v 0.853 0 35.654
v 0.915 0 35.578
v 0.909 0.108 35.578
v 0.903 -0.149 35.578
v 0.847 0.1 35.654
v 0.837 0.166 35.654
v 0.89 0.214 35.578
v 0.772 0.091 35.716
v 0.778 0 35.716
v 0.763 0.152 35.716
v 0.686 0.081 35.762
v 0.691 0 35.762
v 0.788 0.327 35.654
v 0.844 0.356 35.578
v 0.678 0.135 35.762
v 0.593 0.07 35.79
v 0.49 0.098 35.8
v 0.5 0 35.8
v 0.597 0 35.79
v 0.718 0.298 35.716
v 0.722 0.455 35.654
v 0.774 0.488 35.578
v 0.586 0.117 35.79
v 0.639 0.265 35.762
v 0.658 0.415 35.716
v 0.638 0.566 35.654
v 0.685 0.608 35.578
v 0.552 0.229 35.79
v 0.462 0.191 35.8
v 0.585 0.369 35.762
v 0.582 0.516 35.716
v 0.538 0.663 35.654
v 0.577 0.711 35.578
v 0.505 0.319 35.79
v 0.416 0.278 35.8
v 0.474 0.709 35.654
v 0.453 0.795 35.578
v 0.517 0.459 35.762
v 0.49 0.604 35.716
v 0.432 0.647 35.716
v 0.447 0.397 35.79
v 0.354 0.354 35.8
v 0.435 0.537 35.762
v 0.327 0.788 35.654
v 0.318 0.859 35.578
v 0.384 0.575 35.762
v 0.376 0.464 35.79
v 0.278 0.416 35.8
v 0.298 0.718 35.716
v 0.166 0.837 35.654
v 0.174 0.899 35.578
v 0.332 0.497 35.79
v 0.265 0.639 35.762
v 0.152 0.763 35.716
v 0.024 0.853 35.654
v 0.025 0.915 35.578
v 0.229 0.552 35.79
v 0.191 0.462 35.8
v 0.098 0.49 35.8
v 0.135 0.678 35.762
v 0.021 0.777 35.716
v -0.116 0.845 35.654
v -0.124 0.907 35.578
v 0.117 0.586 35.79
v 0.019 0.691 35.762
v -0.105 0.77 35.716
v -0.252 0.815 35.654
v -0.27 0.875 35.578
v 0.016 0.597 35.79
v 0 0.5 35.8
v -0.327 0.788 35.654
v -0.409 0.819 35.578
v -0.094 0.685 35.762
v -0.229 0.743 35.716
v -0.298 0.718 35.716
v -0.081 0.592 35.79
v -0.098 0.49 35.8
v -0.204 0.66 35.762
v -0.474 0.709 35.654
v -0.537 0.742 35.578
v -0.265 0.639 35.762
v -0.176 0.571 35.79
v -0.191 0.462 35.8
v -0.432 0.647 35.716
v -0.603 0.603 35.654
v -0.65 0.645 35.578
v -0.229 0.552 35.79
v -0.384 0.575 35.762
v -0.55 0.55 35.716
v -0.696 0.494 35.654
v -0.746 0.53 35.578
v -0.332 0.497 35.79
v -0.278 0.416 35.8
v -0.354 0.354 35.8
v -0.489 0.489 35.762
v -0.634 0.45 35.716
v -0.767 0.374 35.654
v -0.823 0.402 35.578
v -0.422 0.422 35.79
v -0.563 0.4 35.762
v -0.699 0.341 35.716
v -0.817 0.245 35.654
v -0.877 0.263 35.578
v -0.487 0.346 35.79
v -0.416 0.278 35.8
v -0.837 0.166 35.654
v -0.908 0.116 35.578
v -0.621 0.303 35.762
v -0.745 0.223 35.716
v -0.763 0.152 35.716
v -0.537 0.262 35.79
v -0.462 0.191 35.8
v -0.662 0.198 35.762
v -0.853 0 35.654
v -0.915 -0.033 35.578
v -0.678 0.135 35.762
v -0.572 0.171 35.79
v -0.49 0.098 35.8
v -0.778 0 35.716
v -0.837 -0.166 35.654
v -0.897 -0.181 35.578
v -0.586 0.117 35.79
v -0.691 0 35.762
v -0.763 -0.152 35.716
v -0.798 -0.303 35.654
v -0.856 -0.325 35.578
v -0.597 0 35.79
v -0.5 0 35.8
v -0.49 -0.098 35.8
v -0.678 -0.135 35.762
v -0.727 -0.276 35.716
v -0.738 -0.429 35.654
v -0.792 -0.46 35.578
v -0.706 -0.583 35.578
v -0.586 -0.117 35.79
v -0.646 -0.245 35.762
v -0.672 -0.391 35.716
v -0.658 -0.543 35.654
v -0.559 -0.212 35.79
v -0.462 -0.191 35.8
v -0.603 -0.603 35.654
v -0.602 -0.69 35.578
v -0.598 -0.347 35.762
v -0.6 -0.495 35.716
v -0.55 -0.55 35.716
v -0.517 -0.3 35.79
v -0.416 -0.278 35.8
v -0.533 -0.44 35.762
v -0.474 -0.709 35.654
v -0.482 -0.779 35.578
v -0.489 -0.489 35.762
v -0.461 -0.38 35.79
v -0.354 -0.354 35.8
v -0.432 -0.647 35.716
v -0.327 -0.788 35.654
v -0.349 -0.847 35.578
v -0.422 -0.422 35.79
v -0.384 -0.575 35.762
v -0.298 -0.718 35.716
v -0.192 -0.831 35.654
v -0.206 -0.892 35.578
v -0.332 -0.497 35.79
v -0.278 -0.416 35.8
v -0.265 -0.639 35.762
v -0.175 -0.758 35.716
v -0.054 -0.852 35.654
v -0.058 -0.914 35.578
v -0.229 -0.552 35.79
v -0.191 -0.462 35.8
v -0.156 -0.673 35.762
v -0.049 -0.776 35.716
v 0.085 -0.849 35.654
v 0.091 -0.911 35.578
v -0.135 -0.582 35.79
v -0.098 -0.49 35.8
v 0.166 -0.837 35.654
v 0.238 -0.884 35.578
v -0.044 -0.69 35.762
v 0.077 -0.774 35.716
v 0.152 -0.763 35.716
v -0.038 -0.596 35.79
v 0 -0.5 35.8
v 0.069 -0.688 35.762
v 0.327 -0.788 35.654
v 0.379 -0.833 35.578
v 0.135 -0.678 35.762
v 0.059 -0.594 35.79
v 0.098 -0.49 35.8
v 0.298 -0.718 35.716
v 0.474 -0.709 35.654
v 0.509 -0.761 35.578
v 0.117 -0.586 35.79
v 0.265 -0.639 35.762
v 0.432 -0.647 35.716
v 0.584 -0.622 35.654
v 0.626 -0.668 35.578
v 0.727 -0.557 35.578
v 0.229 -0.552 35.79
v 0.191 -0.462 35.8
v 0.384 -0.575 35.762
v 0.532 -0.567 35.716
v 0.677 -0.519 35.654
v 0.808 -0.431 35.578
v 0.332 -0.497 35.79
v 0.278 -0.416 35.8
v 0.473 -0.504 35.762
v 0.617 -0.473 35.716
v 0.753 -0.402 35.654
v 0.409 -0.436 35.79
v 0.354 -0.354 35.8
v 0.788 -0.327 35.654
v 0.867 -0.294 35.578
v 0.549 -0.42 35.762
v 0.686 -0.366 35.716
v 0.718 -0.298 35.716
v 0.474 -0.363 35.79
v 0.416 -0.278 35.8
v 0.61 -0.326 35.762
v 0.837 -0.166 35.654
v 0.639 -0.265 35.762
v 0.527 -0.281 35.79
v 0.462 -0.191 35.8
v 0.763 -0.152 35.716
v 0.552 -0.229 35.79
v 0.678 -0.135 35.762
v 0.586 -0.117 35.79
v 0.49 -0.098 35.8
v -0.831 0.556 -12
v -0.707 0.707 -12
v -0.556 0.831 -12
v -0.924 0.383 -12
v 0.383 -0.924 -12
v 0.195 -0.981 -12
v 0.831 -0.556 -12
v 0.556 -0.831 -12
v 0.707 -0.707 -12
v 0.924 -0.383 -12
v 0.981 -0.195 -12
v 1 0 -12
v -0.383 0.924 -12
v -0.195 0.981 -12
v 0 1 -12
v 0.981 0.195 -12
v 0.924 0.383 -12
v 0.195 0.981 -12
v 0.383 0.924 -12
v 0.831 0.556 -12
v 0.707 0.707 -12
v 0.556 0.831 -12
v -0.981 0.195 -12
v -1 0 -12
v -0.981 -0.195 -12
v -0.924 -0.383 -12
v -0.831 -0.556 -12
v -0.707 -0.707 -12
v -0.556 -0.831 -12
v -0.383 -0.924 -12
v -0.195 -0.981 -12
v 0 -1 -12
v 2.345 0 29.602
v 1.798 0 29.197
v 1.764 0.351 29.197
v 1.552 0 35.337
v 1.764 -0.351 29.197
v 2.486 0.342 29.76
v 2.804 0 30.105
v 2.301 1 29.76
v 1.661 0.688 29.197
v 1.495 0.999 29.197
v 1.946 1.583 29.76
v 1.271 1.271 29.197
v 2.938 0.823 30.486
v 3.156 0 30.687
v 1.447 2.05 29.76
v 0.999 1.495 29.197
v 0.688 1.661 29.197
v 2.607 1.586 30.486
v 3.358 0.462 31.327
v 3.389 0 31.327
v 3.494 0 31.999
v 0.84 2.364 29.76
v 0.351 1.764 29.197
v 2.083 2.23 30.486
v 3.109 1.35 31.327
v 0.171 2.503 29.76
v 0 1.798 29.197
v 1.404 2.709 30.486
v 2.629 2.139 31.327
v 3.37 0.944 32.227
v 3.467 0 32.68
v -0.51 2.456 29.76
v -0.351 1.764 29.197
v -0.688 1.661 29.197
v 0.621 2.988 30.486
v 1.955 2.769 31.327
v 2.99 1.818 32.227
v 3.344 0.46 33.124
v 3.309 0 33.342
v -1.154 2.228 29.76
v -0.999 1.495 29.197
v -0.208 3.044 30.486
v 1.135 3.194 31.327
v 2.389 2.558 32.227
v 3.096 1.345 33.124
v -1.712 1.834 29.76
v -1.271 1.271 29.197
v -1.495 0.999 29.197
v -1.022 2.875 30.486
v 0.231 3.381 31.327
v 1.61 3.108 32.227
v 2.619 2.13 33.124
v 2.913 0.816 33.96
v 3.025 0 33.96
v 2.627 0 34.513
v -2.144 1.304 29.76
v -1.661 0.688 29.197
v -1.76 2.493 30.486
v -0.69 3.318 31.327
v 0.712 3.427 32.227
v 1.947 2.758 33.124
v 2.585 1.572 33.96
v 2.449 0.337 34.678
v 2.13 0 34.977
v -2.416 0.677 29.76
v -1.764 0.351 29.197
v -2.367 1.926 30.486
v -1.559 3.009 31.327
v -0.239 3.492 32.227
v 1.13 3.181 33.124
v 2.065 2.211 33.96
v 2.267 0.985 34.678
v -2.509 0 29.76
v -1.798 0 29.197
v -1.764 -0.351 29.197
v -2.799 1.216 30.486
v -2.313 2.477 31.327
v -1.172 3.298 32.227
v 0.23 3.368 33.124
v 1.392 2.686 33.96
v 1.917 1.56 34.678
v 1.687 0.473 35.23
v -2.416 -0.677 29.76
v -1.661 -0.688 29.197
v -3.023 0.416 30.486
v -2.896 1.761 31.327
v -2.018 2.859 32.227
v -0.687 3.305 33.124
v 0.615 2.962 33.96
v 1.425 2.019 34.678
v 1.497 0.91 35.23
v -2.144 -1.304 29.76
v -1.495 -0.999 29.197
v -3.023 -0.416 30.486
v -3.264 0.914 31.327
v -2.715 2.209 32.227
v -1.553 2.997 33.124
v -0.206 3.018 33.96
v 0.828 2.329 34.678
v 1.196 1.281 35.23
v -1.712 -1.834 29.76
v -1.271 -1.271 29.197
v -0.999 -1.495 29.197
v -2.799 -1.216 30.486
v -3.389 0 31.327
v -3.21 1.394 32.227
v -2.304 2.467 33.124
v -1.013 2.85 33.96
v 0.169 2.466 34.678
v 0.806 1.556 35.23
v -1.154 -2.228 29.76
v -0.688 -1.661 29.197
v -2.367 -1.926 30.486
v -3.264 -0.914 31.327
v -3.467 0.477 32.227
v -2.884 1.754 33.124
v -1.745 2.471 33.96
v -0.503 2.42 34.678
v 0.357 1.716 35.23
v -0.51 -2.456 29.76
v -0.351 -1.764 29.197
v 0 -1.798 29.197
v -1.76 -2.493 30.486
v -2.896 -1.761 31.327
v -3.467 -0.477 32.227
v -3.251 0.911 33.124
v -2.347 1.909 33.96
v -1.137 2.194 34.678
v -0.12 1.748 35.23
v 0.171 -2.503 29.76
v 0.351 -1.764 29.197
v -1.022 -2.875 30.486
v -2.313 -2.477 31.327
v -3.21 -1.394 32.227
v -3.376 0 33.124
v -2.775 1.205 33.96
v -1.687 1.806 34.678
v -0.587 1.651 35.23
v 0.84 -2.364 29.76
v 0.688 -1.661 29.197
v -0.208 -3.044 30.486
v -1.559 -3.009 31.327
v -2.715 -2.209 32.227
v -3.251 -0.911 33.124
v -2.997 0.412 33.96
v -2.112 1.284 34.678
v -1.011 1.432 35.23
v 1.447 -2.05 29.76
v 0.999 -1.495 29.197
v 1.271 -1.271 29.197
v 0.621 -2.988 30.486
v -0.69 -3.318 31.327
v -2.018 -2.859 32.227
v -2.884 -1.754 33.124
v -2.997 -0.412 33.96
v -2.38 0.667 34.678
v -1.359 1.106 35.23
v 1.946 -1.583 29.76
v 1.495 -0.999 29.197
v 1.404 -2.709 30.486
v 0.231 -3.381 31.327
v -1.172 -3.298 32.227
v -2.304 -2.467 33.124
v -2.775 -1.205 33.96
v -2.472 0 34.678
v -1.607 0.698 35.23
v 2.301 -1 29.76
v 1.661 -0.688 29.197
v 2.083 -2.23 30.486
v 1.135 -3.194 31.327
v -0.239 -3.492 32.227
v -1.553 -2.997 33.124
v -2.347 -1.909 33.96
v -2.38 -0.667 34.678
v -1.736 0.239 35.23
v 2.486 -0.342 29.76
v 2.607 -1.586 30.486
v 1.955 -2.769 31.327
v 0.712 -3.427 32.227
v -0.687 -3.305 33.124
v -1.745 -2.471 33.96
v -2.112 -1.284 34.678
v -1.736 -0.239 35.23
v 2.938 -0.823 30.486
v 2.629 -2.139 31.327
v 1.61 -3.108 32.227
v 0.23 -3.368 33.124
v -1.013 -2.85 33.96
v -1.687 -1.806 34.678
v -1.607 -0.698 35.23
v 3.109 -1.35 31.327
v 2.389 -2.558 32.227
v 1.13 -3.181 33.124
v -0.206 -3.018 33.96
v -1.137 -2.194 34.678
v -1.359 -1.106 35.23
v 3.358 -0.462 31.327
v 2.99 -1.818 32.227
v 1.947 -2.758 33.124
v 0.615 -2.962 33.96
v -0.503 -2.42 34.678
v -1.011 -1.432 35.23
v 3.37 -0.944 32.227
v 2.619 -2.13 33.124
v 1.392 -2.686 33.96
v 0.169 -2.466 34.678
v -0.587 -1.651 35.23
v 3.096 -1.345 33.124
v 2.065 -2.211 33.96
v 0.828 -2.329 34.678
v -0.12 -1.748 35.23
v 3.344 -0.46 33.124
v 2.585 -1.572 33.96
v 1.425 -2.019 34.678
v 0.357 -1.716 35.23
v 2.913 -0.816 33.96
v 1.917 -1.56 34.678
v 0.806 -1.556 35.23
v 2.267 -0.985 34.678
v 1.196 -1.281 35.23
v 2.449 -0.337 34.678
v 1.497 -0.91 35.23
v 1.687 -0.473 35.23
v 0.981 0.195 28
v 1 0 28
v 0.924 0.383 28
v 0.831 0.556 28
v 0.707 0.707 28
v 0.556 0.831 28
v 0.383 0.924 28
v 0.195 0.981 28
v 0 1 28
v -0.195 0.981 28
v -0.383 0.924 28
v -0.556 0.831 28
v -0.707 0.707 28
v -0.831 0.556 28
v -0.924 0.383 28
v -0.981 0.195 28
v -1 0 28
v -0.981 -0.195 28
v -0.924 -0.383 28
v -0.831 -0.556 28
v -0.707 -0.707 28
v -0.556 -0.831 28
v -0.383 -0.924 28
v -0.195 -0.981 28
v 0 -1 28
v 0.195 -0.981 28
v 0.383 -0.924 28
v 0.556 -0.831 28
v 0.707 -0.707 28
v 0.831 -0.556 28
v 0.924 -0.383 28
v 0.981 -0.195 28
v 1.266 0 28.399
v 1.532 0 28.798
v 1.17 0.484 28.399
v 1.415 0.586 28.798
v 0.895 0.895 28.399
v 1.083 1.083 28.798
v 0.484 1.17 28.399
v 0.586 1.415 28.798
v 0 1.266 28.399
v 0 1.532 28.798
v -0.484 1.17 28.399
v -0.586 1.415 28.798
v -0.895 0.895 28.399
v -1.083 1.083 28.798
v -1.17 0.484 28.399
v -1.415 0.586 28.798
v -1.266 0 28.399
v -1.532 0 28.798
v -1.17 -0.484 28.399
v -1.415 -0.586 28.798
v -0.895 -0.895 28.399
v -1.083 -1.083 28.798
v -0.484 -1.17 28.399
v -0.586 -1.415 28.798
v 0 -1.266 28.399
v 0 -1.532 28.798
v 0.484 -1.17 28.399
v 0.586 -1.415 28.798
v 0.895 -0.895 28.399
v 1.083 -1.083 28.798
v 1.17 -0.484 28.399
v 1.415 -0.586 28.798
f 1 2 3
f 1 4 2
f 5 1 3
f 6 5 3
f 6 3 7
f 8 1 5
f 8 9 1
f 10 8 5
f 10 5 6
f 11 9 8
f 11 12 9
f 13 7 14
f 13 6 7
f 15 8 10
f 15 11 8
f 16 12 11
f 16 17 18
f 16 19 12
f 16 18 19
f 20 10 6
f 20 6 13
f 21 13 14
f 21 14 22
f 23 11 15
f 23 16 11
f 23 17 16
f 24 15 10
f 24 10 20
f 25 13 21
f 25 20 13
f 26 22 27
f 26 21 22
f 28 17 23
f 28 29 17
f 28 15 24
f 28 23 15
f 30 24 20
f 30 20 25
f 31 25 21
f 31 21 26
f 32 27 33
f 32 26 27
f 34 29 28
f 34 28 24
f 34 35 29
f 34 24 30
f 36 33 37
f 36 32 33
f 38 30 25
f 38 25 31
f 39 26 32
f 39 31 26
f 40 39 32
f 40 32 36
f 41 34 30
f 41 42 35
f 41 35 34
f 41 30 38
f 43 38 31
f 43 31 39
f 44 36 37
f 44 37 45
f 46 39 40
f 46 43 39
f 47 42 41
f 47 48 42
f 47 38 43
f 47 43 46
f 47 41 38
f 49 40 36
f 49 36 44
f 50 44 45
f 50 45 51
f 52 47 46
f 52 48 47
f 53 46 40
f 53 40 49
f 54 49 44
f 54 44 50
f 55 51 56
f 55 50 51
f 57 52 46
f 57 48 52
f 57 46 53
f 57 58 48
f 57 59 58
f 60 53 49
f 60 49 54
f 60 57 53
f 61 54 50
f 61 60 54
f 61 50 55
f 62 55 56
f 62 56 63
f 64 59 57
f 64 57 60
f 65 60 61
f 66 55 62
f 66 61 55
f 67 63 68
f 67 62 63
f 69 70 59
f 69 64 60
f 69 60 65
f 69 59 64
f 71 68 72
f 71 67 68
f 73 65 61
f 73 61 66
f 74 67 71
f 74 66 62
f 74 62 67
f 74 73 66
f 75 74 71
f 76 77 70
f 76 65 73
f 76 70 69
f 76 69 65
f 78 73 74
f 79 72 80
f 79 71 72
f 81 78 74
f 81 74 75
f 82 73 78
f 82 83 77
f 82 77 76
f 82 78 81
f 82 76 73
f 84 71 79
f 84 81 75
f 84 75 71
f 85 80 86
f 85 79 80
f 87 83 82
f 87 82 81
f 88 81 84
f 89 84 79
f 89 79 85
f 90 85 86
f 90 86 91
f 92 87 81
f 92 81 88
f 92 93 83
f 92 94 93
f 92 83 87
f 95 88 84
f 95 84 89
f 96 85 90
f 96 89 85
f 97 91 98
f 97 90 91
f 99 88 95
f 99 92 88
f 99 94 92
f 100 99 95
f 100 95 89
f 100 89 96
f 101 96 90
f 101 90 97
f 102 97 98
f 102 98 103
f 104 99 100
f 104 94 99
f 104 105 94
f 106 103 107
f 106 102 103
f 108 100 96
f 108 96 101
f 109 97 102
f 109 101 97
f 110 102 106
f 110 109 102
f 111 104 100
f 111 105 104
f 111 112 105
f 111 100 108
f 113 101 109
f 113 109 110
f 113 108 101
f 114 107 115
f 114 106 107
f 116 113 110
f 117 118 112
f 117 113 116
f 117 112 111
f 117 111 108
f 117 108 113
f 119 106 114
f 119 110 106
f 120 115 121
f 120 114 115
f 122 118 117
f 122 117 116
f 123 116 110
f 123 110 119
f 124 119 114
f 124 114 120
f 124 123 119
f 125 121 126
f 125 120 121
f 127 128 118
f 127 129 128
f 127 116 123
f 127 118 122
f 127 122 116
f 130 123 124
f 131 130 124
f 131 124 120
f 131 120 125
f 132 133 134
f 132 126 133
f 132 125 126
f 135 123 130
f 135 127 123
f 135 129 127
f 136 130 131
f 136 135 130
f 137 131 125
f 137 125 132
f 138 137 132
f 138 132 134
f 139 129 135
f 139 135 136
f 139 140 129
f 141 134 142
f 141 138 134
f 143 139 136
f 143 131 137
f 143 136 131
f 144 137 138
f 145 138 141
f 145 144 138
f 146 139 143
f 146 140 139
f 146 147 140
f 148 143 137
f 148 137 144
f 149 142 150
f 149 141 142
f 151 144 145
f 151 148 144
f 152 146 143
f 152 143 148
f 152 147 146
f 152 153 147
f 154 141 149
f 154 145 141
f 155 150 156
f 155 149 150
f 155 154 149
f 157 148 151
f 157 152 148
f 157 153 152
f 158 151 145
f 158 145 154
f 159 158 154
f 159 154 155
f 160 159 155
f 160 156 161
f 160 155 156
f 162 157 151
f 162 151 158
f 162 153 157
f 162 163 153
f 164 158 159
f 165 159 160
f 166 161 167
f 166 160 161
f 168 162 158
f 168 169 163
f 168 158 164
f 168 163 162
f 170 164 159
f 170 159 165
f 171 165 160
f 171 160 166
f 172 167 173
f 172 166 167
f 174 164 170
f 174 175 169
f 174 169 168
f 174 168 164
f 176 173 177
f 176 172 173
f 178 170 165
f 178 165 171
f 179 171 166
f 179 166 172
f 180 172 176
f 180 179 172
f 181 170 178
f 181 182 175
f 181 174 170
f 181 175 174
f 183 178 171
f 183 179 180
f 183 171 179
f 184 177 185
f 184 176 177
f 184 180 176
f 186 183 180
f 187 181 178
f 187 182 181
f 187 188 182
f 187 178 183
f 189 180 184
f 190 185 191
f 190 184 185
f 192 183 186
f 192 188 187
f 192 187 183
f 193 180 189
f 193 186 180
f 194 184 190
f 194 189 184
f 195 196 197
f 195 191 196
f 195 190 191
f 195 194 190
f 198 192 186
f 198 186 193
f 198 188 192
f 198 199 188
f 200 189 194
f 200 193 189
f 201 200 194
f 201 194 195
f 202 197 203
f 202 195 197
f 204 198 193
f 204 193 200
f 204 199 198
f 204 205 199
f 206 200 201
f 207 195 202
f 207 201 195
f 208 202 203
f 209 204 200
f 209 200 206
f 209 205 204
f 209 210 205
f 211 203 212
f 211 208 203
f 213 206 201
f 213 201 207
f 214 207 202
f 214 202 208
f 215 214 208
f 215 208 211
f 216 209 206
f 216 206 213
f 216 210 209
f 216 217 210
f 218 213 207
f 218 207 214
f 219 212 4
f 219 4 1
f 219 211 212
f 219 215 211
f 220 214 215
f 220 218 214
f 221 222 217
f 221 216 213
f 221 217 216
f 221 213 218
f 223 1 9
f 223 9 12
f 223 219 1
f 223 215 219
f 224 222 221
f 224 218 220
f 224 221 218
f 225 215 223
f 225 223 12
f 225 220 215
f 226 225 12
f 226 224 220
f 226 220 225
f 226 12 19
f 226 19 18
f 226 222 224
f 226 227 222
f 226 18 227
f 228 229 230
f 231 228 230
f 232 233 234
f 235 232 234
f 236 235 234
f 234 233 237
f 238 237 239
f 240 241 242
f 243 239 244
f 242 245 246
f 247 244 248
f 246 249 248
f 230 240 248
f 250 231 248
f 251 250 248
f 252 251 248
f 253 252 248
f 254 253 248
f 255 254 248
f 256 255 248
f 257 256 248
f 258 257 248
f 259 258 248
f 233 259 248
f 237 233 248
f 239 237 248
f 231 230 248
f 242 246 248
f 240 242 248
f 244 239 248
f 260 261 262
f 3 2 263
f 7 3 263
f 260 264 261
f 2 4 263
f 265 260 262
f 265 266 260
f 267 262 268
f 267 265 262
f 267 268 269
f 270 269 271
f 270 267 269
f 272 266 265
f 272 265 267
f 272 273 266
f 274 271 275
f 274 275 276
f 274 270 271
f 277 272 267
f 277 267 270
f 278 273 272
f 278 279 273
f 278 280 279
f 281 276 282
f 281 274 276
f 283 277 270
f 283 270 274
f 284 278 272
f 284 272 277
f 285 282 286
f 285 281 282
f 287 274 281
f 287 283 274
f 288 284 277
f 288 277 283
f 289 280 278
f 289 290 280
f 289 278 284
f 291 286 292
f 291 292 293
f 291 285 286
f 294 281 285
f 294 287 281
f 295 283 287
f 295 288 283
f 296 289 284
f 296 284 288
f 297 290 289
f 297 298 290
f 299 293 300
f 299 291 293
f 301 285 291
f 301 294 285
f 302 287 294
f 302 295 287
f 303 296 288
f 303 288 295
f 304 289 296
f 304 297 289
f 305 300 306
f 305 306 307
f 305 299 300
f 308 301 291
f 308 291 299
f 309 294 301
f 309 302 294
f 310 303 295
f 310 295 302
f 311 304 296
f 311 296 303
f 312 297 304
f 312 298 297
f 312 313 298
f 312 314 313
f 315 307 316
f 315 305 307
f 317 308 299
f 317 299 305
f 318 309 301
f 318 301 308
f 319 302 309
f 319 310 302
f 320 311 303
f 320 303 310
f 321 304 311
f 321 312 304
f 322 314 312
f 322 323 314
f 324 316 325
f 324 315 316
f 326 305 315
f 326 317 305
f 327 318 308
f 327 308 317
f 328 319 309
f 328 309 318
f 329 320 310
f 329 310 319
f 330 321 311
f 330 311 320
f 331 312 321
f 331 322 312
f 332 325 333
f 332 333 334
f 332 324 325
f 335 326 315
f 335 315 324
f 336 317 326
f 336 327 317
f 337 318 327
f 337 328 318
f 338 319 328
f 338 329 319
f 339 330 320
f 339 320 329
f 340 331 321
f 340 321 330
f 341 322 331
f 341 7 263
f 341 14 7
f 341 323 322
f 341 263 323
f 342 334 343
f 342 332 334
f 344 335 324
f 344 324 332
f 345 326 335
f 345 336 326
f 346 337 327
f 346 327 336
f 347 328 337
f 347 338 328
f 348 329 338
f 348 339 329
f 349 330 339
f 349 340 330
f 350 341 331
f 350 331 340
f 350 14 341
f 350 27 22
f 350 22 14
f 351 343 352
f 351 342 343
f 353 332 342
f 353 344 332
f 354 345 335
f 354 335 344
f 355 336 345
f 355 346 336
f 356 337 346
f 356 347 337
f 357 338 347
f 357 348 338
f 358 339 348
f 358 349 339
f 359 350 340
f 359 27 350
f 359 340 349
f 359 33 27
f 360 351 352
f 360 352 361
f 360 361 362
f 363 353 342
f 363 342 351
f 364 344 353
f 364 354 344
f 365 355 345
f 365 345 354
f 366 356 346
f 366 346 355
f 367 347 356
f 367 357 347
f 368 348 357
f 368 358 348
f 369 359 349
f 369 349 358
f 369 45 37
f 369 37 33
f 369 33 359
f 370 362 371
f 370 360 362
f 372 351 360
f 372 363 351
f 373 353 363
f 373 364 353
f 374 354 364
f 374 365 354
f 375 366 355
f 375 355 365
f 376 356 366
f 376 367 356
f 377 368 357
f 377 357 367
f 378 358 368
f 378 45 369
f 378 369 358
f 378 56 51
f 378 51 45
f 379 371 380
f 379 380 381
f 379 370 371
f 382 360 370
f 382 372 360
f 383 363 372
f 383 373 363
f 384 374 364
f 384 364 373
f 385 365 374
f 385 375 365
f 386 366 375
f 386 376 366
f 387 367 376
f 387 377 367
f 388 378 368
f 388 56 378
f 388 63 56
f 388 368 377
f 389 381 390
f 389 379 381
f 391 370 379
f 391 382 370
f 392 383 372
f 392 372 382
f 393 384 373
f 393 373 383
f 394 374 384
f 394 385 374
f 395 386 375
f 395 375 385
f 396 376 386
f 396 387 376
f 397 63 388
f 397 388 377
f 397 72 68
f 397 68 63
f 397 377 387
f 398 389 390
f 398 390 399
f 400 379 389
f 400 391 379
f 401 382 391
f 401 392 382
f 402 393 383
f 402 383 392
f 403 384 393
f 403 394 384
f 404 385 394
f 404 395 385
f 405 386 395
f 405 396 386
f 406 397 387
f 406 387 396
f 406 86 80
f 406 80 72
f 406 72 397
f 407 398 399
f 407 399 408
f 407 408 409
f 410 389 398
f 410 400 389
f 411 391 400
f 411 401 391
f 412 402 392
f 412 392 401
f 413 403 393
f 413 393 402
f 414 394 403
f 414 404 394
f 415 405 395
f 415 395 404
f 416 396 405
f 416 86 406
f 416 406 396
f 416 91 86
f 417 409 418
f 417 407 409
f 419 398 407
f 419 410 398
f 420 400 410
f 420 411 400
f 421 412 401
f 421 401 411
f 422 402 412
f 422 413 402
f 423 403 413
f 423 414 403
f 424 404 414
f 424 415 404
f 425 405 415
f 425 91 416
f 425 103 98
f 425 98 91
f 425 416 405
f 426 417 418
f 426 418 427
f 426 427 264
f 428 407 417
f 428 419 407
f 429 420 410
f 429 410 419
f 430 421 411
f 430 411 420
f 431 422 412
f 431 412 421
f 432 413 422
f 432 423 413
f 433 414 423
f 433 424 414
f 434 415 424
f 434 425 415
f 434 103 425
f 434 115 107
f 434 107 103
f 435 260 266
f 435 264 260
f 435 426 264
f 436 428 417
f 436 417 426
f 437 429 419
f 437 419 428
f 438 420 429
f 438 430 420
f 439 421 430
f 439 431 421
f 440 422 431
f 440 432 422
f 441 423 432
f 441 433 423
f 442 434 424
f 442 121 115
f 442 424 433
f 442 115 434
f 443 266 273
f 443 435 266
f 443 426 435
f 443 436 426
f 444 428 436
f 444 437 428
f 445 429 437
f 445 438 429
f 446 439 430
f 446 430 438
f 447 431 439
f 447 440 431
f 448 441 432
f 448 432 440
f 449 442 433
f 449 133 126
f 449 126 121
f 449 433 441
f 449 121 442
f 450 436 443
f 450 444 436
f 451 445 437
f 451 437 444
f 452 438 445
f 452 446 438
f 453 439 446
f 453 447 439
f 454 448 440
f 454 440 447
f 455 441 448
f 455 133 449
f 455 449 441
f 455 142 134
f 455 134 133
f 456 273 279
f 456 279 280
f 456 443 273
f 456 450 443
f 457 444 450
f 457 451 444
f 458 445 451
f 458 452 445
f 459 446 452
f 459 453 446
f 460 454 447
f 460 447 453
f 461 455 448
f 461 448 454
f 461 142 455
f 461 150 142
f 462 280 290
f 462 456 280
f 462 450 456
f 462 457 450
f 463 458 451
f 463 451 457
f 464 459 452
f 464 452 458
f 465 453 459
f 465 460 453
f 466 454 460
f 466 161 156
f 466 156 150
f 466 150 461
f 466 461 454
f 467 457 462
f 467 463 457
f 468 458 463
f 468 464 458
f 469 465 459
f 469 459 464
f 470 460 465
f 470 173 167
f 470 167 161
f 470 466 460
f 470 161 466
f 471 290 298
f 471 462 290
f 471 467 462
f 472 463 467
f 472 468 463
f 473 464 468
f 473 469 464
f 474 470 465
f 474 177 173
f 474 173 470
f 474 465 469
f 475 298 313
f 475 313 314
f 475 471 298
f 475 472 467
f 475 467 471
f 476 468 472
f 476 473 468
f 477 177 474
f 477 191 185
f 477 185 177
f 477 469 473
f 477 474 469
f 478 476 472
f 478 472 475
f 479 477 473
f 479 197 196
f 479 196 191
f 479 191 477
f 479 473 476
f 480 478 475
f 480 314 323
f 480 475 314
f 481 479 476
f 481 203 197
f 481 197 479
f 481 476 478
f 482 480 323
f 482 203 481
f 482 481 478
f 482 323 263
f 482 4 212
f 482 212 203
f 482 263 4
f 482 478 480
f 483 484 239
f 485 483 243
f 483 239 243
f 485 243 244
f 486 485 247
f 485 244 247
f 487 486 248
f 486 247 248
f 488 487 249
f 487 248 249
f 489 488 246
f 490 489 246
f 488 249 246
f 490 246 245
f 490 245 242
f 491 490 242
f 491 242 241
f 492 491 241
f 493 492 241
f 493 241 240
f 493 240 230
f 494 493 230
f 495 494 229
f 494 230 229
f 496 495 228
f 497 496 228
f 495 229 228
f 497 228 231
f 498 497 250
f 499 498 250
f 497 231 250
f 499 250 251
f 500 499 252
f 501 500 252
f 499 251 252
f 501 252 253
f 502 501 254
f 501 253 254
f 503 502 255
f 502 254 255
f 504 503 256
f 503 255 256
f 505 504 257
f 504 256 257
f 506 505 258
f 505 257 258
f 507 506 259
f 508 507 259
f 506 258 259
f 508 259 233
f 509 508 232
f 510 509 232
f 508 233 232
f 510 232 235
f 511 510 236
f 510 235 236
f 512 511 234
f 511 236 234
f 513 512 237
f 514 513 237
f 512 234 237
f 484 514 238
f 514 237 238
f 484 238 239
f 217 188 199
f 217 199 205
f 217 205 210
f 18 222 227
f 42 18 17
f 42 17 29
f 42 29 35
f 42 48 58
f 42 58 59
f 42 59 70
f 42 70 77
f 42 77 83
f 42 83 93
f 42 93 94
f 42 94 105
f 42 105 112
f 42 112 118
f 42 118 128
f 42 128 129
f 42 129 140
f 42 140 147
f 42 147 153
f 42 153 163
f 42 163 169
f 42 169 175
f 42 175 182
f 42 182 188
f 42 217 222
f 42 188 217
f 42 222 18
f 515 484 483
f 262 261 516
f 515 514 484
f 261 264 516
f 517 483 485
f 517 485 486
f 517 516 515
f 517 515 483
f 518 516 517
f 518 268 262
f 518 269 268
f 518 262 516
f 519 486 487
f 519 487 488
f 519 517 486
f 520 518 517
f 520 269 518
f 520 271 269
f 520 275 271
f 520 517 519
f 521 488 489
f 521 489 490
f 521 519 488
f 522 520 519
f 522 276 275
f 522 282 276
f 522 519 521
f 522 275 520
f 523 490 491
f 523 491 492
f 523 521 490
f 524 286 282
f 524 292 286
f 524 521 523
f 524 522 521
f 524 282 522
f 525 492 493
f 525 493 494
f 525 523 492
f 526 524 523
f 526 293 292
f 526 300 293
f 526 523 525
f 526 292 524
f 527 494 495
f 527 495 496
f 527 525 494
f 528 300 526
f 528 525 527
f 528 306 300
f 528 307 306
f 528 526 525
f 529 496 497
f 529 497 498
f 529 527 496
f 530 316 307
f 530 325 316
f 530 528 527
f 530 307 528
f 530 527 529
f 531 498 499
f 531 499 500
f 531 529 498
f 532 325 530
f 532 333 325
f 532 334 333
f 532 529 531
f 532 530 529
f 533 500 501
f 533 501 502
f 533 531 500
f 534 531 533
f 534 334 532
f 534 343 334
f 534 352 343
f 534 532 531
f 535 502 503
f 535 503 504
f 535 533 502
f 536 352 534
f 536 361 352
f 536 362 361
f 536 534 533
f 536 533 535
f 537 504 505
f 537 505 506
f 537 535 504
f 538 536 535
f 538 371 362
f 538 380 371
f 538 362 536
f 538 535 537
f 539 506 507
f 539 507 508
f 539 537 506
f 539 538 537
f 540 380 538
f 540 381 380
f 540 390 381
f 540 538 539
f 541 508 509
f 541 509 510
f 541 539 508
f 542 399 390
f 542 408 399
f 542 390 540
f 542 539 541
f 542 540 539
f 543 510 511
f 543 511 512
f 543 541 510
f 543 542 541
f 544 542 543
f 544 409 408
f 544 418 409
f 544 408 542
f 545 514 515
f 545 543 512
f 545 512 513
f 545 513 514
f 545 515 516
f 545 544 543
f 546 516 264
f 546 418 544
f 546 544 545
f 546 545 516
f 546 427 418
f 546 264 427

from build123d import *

# Parameters (mm, degrees)
CYLINDER_R        = 1
CYLINDER_DEPTH    = 40
CYLINDER001_R     = 1
CYLINDER001_DEPTH = 10
FILLET_R          = 0.5


with BuildPart() as esfera:
    # Sphere → Sphere (revolve)
    with BuildSketch(Plane(origin=(0, 0, 32.2), x_dir=(1, 0, 0), z_dir=(0, -1, 0))):
        with BuildLine():
            ThreePointArc((0, -3.5), (3.5, 0), (0, 3.5))
            Line((0, 3.5), (0, -3.5))
        make_face()
    revolve(axis=Axis((0, 0, 32.2), (0, 0, 1)))


with BuildPart() as cono:
    # Cone → Cone (revolve)
    with BuildSketch(Plane(origin=(0, 0, 28), x_dir=(1, 0, 0), z_dir=(0, -1, 0))):
        Polygon((0, 0), (1, 0), (3, 3), (0, 3), align=None)
    revolve(axis=Axis((0, 0, 28), (0, 0, 1)))


with BuildPart() as fusion:
    # Cylinder → Cylinder (new body)
    with BuildSketch(Plane.XY.offset(-12)):
        Circle(CYLINDER_R)
    extrude(amount=CYLINDER_DEPTH)

    # Fusion: union Cono
    add(cono.part)


with BuildPart() as fusion002:
    # Cylinder001 → Cylinder001 (new body)
    with BuildSketch(Plane.XY.offset(25.8)):
        Circle(CYLINDER001_R)
    extrude(amount=CYLINDER001_DEPTH)

    # Fillet
    fillet_edges = [fusion002.edges().sort_by_distance(p)[0] for p in [
        (-1, 0, 35.8),
    ]]
    fillet(fillet_edges, radius=FILLET_R)

    # Fusion001: union Fusion
    add(fusion.part)

    # Fusion002: union Esfera
    add(esfera.part)


solid = fusion002.part
